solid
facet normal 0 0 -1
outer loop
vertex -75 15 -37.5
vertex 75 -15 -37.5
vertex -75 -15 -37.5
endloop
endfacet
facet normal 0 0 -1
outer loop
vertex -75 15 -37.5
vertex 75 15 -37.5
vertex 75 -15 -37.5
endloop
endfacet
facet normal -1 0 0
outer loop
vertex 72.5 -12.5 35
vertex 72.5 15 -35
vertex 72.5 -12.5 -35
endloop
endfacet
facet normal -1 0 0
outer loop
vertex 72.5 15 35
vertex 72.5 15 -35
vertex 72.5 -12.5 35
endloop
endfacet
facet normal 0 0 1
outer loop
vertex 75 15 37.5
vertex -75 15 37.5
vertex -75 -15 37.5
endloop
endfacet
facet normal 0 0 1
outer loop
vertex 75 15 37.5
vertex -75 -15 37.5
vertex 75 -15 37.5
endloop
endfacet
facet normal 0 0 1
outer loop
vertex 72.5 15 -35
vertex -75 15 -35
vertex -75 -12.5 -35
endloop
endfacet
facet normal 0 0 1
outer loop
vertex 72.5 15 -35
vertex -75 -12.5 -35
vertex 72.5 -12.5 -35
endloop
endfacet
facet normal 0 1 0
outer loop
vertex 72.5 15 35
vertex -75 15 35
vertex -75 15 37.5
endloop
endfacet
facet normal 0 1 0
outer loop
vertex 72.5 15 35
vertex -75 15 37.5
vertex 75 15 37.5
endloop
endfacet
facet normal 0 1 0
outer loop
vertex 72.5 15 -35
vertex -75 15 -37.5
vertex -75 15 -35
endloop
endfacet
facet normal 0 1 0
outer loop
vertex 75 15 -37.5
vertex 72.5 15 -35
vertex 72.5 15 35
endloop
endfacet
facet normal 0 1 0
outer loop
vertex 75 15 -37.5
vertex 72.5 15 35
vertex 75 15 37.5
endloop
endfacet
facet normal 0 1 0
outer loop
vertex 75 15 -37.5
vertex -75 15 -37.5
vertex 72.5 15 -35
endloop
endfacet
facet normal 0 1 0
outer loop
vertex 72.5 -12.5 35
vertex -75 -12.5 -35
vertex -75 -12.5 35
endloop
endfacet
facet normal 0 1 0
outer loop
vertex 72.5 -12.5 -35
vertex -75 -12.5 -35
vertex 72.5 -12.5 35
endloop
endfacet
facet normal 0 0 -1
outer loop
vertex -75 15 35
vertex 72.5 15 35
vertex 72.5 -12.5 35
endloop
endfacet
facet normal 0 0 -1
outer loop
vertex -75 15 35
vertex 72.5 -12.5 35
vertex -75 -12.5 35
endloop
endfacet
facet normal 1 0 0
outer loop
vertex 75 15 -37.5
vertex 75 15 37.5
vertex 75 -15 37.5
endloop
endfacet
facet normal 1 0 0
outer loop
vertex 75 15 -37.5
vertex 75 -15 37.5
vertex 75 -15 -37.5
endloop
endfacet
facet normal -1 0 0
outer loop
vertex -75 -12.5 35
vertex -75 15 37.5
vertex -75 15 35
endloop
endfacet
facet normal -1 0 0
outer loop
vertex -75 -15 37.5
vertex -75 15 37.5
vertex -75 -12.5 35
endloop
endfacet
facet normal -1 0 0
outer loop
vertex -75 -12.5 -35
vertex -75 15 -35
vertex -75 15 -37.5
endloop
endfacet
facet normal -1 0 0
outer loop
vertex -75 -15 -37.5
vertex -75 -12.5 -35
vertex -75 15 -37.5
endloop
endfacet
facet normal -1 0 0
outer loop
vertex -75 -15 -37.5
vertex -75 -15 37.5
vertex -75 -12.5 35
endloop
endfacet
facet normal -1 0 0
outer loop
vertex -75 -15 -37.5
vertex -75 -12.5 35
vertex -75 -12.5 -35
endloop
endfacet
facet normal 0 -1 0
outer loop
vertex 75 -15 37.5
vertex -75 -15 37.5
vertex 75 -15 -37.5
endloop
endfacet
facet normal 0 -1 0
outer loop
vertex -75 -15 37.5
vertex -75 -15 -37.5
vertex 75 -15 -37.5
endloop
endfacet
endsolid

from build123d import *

# Parameters (mm, degrees)
BOSS_EXTRUDE1_DEPTH = 15
BOSS_EXTRUDE2_START = -15
SKETCH2_3_W         = 145
SKETCH2_3_H         = 70
SKETCH2_3_W_2       = 2.5
BOSS_EXTRUDE2_DEPTH = 2.5


with BuildPart() as part:
    # Sketch2 → Boss-Extrude1 (new, symmetric)
    with BuildSketch(Plane(origin=(0, 0, 0), x_dir=(1, 0, 0), z_dir=(0, 1, 0))):
        Polygon((-75, 35), (-72.5, 35), (72.5, 35), (72.5, -35), (-72.5, -35), (-75, -35), (-75, -37.5), (75, -37.5), (75, 37.5), (-75, 37.5), align=None)
    extrude(amount=BOSS_EXTRUDE1_DEPTH, both=True)

    # Sketch2<3> → Boss-Extrude2 (add)
    with BuildSketch(Plane(origin=(0, 0, 0), x_dir=(1, 0, 0), z_dir=(0, 1, 0)).offset(BOSS_EXTRUDE2_START)):
        Rectangle(SKETCH2_3_W, SKETCH2_3_H)
        with Locations((-73.75, 0)):
            Rectangle(SKETCH2_3_W_2, SKETCH2_3_H)
    extrude(amount=BOSS_EXTRUDE2_DEPTH)


solid = part.part
